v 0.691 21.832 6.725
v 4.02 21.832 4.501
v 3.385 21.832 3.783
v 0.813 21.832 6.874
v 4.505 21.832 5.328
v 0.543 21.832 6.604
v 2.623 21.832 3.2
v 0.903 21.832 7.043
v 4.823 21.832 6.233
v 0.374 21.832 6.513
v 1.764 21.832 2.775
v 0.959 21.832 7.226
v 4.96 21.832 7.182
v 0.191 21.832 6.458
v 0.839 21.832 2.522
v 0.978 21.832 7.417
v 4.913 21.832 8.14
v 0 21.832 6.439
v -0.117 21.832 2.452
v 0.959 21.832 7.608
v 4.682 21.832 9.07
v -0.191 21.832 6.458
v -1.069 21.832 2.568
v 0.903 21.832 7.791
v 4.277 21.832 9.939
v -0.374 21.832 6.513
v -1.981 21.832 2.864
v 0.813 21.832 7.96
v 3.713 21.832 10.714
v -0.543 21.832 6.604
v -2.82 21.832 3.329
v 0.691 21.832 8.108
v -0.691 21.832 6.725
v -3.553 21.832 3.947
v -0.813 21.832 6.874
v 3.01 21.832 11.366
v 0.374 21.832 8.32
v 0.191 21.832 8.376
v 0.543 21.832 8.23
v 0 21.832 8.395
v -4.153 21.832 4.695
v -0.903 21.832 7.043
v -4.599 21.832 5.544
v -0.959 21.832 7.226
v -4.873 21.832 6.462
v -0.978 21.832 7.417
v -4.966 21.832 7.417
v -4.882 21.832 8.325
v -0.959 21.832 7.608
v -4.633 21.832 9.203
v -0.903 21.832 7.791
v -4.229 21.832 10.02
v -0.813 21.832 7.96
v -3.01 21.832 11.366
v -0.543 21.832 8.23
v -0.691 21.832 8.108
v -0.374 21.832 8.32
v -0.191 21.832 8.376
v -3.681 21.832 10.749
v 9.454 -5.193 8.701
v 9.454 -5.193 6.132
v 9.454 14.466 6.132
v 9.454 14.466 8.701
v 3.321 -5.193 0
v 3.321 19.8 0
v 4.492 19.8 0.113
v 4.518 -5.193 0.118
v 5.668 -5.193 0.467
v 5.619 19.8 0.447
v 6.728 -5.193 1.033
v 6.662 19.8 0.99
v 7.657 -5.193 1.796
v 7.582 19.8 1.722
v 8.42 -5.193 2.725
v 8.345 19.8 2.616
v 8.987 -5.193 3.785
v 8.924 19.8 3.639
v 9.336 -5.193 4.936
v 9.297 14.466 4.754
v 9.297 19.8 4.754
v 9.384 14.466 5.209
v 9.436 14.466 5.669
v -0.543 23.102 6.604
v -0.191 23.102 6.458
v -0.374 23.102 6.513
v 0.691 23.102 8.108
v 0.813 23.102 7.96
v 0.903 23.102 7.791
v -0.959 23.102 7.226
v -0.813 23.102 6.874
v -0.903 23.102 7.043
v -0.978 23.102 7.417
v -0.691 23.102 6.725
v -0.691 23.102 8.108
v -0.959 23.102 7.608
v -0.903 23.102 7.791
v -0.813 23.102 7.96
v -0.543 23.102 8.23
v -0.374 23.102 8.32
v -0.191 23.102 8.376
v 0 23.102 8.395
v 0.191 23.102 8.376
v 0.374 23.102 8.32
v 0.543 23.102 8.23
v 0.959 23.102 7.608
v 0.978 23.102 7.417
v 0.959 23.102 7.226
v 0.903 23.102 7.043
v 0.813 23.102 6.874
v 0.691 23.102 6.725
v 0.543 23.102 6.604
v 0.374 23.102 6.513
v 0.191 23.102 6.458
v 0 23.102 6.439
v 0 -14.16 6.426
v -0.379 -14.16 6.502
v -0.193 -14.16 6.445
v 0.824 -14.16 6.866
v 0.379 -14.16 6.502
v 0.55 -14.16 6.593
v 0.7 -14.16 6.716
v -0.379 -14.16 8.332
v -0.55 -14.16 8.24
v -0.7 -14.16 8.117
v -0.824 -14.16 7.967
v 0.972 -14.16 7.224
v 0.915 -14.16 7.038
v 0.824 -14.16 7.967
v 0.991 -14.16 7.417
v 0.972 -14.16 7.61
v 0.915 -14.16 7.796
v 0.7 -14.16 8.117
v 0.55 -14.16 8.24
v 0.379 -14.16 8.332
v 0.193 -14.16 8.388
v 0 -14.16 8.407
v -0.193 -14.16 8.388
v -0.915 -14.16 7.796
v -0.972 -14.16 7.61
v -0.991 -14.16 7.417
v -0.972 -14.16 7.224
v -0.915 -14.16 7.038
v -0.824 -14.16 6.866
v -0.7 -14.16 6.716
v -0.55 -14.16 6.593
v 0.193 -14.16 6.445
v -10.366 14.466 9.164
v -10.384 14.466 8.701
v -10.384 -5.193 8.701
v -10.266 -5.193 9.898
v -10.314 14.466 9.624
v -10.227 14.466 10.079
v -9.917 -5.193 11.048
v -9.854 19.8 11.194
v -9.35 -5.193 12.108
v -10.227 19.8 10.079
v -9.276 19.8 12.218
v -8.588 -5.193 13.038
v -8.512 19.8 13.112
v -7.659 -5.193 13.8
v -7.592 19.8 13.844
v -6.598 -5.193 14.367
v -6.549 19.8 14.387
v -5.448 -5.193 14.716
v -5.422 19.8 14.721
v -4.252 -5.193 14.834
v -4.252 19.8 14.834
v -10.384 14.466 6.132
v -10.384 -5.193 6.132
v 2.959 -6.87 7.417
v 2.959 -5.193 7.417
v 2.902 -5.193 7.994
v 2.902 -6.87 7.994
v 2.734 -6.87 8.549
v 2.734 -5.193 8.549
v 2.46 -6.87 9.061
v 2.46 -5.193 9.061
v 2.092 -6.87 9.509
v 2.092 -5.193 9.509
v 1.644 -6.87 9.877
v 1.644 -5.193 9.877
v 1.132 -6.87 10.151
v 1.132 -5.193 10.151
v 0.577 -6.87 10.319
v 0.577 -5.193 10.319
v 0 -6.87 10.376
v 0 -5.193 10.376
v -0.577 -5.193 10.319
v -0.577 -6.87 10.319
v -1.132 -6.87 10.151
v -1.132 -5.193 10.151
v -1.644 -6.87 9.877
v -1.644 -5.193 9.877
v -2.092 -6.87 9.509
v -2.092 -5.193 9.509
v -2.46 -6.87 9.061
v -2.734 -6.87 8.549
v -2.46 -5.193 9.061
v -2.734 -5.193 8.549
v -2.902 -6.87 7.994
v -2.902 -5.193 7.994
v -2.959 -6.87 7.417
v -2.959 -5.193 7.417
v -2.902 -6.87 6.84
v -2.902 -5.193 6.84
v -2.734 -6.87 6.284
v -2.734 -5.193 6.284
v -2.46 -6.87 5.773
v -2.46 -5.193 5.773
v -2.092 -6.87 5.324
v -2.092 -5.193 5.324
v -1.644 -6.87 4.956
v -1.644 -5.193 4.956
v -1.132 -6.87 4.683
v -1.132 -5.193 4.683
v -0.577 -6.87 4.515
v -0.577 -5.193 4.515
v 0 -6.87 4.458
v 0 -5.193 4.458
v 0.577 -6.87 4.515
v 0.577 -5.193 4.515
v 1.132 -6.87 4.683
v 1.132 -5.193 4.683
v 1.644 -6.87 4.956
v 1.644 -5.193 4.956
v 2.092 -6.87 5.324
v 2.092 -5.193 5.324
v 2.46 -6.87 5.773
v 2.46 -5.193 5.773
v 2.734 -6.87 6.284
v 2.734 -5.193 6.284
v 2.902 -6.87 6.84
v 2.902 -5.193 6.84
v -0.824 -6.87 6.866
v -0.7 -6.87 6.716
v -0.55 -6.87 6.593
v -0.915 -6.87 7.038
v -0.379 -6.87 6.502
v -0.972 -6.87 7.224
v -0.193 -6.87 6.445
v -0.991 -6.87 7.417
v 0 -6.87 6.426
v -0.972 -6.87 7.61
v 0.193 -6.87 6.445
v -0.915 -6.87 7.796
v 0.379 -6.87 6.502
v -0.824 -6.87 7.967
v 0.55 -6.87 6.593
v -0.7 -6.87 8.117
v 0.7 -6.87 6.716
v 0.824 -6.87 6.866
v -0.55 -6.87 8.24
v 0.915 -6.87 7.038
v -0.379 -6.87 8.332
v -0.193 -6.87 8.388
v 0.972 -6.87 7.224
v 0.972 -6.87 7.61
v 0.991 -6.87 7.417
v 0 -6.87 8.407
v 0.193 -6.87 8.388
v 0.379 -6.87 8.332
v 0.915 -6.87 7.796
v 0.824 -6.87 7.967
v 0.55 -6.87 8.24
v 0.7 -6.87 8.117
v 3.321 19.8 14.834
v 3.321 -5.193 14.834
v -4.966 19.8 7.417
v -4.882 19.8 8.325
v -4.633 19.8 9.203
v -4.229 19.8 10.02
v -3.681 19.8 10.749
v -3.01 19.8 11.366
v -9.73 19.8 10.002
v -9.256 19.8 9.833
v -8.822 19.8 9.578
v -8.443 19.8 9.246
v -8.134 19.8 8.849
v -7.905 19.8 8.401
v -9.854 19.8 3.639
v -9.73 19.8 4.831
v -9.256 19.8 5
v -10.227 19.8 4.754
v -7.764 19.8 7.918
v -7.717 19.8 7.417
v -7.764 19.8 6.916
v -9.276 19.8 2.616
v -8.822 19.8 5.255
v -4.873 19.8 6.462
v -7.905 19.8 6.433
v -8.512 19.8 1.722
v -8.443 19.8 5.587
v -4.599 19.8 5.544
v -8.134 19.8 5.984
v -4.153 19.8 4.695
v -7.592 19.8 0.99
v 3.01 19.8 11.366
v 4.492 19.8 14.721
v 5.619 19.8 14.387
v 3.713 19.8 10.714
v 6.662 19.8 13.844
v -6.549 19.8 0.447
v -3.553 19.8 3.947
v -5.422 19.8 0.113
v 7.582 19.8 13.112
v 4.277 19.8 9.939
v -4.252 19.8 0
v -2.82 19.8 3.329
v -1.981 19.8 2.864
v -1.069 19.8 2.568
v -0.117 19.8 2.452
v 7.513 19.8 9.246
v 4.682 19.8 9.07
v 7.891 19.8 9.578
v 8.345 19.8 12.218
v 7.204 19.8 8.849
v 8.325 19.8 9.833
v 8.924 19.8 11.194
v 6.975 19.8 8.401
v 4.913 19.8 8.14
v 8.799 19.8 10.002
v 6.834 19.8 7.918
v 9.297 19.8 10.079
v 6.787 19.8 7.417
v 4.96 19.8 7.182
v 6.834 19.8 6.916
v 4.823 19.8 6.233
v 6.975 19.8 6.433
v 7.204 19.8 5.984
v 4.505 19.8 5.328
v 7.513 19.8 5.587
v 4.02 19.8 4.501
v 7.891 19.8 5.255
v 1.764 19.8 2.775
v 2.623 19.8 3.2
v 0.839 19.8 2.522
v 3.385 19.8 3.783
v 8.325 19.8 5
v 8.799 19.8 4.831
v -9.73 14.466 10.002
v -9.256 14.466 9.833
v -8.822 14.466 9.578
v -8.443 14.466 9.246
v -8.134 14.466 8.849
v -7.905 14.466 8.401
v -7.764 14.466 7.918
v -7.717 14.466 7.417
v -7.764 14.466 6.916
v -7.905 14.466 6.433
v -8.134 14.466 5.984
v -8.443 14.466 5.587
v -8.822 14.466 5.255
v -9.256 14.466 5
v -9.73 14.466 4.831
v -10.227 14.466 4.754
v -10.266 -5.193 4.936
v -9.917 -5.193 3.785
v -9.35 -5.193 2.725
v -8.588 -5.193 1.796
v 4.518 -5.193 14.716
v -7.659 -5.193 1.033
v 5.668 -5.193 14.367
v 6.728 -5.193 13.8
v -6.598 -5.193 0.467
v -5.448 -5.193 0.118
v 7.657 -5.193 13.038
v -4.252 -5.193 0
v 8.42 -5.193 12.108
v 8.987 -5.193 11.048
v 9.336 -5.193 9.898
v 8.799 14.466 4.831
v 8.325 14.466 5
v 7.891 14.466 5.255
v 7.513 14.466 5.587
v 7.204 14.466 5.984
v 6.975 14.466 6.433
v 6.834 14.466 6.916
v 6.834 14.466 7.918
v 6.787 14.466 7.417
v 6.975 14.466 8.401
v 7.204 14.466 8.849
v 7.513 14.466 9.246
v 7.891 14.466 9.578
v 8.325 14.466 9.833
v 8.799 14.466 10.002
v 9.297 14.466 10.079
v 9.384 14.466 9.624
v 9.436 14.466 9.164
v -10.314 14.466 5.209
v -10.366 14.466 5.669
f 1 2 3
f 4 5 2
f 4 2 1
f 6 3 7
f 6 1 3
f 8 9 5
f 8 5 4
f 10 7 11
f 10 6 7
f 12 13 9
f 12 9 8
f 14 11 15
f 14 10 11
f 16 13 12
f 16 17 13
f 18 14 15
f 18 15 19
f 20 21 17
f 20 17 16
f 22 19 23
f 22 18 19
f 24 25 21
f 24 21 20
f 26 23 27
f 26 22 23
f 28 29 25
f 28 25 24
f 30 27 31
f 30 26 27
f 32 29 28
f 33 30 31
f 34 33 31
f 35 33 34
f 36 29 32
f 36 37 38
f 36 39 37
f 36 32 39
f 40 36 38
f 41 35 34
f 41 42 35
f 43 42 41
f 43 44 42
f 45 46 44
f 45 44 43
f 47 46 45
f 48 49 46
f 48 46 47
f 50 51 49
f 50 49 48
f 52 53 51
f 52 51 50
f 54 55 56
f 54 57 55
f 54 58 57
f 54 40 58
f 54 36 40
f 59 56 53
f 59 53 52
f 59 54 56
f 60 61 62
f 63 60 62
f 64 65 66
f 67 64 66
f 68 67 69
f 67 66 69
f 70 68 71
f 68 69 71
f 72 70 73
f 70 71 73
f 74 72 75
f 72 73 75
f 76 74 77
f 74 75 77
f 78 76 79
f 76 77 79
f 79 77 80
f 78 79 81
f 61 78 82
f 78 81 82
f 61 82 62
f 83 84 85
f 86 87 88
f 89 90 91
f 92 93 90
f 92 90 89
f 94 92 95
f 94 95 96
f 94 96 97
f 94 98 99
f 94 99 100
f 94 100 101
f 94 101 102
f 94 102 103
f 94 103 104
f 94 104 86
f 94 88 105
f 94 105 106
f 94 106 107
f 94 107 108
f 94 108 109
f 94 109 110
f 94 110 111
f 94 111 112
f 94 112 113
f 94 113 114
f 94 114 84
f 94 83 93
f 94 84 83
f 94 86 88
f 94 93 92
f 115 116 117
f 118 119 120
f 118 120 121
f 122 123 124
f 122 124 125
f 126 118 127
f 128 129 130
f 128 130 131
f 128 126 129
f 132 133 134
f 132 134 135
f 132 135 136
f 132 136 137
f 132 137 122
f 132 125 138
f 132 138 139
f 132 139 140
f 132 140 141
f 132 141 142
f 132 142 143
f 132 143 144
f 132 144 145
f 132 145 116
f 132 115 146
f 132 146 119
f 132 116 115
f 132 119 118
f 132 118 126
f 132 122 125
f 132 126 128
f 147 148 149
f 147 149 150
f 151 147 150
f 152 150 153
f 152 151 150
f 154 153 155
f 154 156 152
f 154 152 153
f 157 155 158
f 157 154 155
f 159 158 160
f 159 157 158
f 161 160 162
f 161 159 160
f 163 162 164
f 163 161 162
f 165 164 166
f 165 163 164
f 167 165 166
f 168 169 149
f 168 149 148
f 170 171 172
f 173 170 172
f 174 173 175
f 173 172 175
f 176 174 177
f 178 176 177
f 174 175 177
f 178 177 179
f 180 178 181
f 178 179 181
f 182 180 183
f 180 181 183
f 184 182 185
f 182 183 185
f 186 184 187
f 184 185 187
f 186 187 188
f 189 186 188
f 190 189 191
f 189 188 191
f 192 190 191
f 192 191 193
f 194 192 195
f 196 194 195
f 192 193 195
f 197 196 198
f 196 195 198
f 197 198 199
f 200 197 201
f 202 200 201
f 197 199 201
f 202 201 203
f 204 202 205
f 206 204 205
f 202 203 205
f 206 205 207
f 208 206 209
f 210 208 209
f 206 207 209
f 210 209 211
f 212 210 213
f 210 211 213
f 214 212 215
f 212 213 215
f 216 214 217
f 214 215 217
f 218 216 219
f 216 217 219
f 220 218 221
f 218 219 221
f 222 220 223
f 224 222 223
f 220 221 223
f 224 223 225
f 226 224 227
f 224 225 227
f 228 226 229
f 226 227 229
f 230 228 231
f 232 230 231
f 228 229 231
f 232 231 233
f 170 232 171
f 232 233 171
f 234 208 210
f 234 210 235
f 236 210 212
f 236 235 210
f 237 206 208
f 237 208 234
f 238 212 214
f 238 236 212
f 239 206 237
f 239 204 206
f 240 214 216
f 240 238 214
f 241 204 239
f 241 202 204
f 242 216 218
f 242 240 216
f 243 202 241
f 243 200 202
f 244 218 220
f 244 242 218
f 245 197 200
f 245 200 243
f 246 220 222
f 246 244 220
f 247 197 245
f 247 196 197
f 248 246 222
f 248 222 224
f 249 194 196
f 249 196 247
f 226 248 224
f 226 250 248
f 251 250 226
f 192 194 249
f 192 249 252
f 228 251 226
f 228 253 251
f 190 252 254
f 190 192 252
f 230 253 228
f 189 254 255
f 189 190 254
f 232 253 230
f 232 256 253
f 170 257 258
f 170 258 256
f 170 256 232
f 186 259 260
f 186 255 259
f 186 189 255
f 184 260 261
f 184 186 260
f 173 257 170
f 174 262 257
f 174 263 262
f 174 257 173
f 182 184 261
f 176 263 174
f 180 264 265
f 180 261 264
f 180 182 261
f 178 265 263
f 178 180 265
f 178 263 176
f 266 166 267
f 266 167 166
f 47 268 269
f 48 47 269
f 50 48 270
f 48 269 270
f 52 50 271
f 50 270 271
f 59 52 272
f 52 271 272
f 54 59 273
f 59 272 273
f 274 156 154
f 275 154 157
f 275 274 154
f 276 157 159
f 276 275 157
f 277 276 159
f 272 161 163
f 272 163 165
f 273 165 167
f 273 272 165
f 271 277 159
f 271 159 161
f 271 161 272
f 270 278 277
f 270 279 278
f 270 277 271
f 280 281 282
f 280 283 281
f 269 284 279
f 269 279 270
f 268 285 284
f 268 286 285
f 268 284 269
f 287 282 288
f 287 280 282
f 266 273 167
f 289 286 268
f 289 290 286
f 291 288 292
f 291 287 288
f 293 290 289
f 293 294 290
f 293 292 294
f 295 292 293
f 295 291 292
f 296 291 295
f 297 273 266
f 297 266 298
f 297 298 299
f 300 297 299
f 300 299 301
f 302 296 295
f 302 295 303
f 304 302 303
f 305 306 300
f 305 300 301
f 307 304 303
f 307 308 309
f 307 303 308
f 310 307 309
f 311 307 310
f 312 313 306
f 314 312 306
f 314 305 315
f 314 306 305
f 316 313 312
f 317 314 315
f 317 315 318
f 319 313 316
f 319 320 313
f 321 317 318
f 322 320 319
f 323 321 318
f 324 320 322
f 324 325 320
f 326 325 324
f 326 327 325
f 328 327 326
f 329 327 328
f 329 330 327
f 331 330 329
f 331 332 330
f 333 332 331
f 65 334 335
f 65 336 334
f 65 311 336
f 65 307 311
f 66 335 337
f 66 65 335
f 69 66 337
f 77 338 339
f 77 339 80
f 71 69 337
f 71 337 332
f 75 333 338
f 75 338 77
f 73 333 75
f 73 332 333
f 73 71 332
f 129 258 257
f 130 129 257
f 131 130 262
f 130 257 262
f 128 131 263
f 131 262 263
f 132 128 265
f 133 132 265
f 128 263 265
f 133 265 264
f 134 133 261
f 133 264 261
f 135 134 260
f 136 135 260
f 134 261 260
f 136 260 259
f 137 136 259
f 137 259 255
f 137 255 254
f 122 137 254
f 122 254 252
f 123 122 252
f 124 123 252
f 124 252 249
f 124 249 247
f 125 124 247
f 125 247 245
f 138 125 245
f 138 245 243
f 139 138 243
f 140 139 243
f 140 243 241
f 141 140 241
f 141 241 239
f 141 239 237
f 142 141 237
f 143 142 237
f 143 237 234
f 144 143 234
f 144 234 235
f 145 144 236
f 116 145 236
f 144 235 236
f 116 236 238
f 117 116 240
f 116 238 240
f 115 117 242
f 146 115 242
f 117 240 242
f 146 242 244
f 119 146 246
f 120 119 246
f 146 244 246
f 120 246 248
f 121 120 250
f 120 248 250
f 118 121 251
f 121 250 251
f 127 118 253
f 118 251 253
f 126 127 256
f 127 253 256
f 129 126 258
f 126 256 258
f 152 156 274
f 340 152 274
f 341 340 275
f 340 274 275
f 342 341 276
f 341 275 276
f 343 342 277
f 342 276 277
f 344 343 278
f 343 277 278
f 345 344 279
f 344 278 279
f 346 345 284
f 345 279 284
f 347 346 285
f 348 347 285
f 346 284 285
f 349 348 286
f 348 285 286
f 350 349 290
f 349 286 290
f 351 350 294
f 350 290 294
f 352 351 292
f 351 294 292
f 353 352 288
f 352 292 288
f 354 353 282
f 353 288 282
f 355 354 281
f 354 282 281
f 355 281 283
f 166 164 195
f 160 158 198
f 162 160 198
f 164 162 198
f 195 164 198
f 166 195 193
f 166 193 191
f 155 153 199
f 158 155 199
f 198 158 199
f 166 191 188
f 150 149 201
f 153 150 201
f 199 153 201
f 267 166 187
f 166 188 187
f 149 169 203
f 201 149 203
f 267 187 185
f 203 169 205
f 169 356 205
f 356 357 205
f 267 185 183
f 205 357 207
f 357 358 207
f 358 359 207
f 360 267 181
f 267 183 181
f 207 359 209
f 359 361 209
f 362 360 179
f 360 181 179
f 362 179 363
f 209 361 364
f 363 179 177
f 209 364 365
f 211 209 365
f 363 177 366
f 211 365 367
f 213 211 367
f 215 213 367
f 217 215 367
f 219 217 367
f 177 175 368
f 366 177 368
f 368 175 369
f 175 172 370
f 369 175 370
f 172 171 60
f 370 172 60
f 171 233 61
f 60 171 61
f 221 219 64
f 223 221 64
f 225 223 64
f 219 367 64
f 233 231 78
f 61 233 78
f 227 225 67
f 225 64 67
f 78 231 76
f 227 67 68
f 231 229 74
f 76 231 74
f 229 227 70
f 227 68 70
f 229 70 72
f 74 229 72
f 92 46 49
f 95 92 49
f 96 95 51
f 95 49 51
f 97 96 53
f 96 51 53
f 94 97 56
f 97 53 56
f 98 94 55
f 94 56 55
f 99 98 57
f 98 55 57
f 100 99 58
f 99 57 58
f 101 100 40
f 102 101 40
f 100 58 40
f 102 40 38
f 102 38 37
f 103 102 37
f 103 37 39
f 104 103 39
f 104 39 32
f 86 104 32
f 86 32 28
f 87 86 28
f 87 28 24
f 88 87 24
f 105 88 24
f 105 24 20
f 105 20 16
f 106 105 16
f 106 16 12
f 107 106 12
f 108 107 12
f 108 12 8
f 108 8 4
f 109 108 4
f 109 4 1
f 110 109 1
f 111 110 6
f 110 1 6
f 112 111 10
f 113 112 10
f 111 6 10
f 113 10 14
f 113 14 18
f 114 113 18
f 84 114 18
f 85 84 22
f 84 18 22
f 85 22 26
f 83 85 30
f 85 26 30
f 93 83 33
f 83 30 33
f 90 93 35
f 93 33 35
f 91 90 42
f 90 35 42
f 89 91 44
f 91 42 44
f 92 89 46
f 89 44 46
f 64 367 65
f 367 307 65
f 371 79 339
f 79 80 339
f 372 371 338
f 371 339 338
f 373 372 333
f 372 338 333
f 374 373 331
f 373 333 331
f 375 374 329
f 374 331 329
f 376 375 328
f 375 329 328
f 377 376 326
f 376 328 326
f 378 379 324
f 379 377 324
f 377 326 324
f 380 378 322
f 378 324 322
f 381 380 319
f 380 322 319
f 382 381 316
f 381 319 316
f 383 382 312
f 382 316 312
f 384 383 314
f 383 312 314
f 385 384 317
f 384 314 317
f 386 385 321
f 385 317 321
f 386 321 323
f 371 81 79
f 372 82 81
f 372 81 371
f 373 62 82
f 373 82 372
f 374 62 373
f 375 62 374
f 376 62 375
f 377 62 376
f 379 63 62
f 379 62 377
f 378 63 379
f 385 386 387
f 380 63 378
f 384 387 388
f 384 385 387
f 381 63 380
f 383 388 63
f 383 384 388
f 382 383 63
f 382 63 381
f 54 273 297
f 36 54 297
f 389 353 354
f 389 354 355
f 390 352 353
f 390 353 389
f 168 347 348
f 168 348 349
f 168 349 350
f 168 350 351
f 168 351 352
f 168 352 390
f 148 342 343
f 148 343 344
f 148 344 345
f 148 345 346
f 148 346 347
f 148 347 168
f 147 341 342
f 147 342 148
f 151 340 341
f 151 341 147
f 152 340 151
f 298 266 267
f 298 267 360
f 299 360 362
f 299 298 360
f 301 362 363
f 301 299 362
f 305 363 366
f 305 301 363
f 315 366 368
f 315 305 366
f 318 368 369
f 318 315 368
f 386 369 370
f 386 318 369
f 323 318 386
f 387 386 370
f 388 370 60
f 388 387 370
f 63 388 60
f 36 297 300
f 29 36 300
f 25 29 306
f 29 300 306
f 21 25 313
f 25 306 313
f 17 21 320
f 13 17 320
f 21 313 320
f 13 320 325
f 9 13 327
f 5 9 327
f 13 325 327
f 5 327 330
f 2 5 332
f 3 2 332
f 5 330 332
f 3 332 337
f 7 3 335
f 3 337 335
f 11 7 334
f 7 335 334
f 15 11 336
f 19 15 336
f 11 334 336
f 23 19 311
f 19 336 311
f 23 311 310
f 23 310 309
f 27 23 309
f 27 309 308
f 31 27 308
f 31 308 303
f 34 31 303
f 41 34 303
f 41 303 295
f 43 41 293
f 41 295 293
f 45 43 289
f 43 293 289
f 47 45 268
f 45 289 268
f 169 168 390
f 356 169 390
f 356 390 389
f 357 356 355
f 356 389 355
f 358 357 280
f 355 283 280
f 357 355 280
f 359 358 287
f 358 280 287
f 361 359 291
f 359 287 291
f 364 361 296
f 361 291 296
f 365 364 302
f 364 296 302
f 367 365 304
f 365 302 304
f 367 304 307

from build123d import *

# Parameters (mm, degrees)
F0_W      = 19.8374
F0_H      = 24.9936
F1_DEPTH  = 14.8336
F2_R      = 2.9591
F2_R_2    = 0.9906
F3_DEPTH  = 1.6764
F3_FACE_R = 0.9906
F4_DEPTH  = 8.9662
F5_R      = 6.132102
F6_R      = 0.9779
F7_DEPTH  = 2.032
F7_FACE_R = 0.9779
F8_DEPTH  = 3.302
F9_R      = 2.667
F10_DEPTH = 5.334


with BuildPart() as f1:
    # F0 (on Top) → F1 (new body)
    with BuildSketch(Plane.XY):
        with Locations((-0.465175, 7.303395)):
            Rectangle(F0_W, F0_H)
    extrude(amount=F1_DEPTH)

    # F2 (on face) → F3 (join)
    with BuildSketch(Plane.XZ.offset(5.193405)):
        with Locations((0, 7.4168)):
            Circle(F2_R)
        with Locations((0, 7.4168)):
            Circle(F2_R_2, mode=Mode.SUBTRACT)
    extrude(amount=F3_DEPTH)

    # F3_face (on face) → F4 (join)
    with BuildSketch(Plane(origin=(0, -5.193405, 7.4168), x_dir=(1, 0, 0), z_dir=(0, -1, 0))):
        Circle(F3_FACE_R)
    extrude(amount=F4_DEPTH)

    # F5
    f5_edges = [f1.edges().sort_by_distance(p)[0] for p in [
        (9.453525, 7.303395, 14.8336),
        (9.453525, 7.303395, 0),
        (-10.383875, 7.303395, 14.8336),
        (-10.383875, 7.303395, 0),
    ]]
    fillet(f5_edges, radius=F5_R)

    # F6 (on face) → F7 (join)
    with BuildSketch(Plane(origin=(0, 19.800195, 0), x_dir=(-1, 0, 0), z_dir=(0, 1, 0))):
        with BuildLine():
            ThreePointArc((-3.009659, 11.3665), (-2.20376, 2.966899), (4.9657, 7.4168))
            ThreePointArc((4.9657, 7.4168), (4.449901, 9.62056), (3.009659, 11.3665))
            Line((3.009659, 11.3665), (-3.009659, 11.3665))
        make_face()
        with Locations((0, 7.4168)):
            Circle(F6_R, mode=Mode.SUBTRACT)
    extrude(amount=F7_DEPTH)

    # F7_face (on face) → F8 (join)
    with BuildSketch(Plane(origin=(0, 19.800195, 7.4168), x_dir=(-1, 0, 0), z_dir=(0, 1, 0))):
        Circle(F7_FACE_R)
    extrude(amount=F8_DEPTH)

    # F9 (on face) → F10 (cut)
    with BuildSketch(Plane(origin=(0, 19.800195, 0), x_dir=(-1, 0, 0), z_dir=(0, 1, 0))):
        with Locations((-9.453525, 7.4168)):
            Circle(F9_R)
        with Locations((10.383875, 7.4168)):
            Circle(F9_R)
    extrude(amount=-F10_DEPTH, mode=Mode.SUBTRACT)


solid = f1.part
